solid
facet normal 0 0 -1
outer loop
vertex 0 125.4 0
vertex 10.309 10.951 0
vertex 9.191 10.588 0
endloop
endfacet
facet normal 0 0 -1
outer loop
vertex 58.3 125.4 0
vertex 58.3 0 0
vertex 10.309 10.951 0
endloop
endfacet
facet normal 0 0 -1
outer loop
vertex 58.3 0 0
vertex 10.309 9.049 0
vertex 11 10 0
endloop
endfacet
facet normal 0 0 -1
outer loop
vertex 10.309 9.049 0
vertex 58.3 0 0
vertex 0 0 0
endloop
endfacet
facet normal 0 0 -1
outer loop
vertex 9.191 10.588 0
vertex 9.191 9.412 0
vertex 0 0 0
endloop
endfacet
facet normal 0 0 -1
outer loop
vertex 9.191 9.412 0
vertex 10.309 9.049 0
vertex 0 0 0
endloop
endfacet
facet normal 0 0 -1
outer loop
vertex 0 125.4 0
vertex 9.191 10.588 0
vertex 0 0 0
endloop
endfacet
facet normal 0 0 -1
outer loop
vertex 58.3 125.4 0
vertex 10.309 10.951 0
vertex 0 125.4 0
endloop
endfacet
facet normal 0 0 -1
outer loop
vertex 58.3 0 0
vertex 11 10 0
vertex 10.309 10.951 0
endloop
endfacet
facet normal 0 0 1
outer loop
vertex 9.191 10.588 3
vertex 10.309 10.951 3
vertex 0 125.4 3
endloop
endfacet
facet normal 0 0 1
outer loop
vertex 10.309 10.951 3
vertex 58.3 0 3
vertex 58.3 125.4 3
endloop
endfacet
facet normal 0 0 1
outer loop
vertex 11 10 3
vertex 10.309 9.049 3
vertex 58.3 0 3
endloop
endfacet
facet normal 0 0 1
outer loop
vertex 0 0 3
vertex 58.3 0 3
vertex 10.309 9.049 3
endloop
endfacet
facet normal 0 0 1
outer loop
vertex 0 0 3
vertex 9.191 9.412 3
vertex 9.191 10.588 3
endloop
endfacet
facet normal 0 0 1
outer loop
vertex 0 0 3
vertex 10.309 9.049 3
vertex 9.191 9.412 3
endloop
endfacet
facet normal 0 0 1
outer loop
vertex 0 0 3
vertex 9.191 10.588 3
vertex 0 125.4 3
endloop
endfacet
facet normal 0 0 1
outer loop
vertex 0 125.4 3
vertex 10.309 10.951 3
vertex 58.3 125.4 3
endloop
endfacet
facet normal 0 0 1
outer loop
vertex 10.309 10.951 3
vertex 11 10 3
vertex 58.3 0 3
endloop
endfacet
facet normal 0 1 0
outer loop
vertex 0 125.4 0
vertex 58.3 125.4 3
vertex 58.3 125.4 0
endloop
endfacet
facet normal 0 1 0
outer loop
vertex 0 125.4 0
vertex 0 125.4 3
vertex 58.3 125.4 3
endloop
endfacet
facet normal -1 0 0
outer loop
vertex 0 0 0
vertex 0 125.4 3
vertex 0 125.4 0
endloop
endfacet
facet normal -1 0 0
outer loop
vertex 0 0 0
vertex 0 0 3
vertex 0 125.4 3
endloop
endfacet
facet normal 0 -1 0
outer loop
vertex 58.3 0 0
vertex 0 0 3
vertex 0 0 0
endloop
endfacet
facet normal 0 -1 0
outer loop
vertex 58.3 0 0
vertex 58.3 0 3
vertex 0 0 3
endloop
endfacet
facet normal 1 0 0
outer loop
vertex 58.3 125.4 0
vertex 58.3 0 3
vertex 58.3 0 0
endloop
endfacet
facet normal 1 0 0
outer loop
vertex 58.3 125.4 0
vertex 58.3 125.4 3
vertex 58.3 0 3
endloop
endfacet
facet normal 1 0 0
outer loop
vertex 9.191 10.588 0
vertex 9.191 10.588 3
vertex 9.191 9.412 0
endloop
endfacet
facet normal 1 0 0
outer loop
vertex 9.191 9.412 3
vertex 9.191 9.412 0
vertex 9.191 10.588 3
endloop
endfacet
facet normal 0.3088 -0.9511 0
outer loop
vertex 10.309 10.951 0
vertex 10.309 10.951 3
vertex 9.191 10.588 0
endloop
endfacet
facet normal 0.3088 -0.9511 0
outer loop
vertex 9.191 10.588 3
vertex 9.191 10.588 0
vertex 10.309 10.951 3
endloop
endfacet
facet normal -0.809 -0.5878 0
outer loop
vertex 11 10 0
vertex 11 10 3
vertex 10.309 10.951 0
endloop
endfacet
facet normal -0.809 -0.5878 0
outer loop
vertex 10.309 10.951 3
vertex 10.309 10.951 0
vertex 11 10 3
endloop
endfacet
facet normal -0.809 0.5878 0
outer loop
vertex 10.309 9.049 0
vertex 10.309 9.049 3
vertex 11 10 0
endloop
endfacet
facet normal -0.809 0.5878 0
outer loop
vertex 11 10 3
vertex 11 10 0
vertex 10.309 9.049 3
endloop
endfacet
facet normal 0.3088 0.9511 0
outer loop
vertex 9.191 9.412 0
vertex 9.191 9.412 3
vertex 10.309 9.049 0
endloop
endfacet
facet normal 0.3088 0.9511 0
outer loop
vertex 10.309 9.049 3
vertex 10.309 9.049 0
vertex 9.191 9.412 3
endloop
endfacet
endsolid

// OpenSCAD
width = 58.3;
length = 125.4;
height = 3;
corner_r = 10;

linear_extrude(height = height, center=false) {
    difference() {
    square([width, length], center=false);
    translate([corner_r, corner_r, 0]) {
    circle(radius=corner_r);
   }
   }
}
